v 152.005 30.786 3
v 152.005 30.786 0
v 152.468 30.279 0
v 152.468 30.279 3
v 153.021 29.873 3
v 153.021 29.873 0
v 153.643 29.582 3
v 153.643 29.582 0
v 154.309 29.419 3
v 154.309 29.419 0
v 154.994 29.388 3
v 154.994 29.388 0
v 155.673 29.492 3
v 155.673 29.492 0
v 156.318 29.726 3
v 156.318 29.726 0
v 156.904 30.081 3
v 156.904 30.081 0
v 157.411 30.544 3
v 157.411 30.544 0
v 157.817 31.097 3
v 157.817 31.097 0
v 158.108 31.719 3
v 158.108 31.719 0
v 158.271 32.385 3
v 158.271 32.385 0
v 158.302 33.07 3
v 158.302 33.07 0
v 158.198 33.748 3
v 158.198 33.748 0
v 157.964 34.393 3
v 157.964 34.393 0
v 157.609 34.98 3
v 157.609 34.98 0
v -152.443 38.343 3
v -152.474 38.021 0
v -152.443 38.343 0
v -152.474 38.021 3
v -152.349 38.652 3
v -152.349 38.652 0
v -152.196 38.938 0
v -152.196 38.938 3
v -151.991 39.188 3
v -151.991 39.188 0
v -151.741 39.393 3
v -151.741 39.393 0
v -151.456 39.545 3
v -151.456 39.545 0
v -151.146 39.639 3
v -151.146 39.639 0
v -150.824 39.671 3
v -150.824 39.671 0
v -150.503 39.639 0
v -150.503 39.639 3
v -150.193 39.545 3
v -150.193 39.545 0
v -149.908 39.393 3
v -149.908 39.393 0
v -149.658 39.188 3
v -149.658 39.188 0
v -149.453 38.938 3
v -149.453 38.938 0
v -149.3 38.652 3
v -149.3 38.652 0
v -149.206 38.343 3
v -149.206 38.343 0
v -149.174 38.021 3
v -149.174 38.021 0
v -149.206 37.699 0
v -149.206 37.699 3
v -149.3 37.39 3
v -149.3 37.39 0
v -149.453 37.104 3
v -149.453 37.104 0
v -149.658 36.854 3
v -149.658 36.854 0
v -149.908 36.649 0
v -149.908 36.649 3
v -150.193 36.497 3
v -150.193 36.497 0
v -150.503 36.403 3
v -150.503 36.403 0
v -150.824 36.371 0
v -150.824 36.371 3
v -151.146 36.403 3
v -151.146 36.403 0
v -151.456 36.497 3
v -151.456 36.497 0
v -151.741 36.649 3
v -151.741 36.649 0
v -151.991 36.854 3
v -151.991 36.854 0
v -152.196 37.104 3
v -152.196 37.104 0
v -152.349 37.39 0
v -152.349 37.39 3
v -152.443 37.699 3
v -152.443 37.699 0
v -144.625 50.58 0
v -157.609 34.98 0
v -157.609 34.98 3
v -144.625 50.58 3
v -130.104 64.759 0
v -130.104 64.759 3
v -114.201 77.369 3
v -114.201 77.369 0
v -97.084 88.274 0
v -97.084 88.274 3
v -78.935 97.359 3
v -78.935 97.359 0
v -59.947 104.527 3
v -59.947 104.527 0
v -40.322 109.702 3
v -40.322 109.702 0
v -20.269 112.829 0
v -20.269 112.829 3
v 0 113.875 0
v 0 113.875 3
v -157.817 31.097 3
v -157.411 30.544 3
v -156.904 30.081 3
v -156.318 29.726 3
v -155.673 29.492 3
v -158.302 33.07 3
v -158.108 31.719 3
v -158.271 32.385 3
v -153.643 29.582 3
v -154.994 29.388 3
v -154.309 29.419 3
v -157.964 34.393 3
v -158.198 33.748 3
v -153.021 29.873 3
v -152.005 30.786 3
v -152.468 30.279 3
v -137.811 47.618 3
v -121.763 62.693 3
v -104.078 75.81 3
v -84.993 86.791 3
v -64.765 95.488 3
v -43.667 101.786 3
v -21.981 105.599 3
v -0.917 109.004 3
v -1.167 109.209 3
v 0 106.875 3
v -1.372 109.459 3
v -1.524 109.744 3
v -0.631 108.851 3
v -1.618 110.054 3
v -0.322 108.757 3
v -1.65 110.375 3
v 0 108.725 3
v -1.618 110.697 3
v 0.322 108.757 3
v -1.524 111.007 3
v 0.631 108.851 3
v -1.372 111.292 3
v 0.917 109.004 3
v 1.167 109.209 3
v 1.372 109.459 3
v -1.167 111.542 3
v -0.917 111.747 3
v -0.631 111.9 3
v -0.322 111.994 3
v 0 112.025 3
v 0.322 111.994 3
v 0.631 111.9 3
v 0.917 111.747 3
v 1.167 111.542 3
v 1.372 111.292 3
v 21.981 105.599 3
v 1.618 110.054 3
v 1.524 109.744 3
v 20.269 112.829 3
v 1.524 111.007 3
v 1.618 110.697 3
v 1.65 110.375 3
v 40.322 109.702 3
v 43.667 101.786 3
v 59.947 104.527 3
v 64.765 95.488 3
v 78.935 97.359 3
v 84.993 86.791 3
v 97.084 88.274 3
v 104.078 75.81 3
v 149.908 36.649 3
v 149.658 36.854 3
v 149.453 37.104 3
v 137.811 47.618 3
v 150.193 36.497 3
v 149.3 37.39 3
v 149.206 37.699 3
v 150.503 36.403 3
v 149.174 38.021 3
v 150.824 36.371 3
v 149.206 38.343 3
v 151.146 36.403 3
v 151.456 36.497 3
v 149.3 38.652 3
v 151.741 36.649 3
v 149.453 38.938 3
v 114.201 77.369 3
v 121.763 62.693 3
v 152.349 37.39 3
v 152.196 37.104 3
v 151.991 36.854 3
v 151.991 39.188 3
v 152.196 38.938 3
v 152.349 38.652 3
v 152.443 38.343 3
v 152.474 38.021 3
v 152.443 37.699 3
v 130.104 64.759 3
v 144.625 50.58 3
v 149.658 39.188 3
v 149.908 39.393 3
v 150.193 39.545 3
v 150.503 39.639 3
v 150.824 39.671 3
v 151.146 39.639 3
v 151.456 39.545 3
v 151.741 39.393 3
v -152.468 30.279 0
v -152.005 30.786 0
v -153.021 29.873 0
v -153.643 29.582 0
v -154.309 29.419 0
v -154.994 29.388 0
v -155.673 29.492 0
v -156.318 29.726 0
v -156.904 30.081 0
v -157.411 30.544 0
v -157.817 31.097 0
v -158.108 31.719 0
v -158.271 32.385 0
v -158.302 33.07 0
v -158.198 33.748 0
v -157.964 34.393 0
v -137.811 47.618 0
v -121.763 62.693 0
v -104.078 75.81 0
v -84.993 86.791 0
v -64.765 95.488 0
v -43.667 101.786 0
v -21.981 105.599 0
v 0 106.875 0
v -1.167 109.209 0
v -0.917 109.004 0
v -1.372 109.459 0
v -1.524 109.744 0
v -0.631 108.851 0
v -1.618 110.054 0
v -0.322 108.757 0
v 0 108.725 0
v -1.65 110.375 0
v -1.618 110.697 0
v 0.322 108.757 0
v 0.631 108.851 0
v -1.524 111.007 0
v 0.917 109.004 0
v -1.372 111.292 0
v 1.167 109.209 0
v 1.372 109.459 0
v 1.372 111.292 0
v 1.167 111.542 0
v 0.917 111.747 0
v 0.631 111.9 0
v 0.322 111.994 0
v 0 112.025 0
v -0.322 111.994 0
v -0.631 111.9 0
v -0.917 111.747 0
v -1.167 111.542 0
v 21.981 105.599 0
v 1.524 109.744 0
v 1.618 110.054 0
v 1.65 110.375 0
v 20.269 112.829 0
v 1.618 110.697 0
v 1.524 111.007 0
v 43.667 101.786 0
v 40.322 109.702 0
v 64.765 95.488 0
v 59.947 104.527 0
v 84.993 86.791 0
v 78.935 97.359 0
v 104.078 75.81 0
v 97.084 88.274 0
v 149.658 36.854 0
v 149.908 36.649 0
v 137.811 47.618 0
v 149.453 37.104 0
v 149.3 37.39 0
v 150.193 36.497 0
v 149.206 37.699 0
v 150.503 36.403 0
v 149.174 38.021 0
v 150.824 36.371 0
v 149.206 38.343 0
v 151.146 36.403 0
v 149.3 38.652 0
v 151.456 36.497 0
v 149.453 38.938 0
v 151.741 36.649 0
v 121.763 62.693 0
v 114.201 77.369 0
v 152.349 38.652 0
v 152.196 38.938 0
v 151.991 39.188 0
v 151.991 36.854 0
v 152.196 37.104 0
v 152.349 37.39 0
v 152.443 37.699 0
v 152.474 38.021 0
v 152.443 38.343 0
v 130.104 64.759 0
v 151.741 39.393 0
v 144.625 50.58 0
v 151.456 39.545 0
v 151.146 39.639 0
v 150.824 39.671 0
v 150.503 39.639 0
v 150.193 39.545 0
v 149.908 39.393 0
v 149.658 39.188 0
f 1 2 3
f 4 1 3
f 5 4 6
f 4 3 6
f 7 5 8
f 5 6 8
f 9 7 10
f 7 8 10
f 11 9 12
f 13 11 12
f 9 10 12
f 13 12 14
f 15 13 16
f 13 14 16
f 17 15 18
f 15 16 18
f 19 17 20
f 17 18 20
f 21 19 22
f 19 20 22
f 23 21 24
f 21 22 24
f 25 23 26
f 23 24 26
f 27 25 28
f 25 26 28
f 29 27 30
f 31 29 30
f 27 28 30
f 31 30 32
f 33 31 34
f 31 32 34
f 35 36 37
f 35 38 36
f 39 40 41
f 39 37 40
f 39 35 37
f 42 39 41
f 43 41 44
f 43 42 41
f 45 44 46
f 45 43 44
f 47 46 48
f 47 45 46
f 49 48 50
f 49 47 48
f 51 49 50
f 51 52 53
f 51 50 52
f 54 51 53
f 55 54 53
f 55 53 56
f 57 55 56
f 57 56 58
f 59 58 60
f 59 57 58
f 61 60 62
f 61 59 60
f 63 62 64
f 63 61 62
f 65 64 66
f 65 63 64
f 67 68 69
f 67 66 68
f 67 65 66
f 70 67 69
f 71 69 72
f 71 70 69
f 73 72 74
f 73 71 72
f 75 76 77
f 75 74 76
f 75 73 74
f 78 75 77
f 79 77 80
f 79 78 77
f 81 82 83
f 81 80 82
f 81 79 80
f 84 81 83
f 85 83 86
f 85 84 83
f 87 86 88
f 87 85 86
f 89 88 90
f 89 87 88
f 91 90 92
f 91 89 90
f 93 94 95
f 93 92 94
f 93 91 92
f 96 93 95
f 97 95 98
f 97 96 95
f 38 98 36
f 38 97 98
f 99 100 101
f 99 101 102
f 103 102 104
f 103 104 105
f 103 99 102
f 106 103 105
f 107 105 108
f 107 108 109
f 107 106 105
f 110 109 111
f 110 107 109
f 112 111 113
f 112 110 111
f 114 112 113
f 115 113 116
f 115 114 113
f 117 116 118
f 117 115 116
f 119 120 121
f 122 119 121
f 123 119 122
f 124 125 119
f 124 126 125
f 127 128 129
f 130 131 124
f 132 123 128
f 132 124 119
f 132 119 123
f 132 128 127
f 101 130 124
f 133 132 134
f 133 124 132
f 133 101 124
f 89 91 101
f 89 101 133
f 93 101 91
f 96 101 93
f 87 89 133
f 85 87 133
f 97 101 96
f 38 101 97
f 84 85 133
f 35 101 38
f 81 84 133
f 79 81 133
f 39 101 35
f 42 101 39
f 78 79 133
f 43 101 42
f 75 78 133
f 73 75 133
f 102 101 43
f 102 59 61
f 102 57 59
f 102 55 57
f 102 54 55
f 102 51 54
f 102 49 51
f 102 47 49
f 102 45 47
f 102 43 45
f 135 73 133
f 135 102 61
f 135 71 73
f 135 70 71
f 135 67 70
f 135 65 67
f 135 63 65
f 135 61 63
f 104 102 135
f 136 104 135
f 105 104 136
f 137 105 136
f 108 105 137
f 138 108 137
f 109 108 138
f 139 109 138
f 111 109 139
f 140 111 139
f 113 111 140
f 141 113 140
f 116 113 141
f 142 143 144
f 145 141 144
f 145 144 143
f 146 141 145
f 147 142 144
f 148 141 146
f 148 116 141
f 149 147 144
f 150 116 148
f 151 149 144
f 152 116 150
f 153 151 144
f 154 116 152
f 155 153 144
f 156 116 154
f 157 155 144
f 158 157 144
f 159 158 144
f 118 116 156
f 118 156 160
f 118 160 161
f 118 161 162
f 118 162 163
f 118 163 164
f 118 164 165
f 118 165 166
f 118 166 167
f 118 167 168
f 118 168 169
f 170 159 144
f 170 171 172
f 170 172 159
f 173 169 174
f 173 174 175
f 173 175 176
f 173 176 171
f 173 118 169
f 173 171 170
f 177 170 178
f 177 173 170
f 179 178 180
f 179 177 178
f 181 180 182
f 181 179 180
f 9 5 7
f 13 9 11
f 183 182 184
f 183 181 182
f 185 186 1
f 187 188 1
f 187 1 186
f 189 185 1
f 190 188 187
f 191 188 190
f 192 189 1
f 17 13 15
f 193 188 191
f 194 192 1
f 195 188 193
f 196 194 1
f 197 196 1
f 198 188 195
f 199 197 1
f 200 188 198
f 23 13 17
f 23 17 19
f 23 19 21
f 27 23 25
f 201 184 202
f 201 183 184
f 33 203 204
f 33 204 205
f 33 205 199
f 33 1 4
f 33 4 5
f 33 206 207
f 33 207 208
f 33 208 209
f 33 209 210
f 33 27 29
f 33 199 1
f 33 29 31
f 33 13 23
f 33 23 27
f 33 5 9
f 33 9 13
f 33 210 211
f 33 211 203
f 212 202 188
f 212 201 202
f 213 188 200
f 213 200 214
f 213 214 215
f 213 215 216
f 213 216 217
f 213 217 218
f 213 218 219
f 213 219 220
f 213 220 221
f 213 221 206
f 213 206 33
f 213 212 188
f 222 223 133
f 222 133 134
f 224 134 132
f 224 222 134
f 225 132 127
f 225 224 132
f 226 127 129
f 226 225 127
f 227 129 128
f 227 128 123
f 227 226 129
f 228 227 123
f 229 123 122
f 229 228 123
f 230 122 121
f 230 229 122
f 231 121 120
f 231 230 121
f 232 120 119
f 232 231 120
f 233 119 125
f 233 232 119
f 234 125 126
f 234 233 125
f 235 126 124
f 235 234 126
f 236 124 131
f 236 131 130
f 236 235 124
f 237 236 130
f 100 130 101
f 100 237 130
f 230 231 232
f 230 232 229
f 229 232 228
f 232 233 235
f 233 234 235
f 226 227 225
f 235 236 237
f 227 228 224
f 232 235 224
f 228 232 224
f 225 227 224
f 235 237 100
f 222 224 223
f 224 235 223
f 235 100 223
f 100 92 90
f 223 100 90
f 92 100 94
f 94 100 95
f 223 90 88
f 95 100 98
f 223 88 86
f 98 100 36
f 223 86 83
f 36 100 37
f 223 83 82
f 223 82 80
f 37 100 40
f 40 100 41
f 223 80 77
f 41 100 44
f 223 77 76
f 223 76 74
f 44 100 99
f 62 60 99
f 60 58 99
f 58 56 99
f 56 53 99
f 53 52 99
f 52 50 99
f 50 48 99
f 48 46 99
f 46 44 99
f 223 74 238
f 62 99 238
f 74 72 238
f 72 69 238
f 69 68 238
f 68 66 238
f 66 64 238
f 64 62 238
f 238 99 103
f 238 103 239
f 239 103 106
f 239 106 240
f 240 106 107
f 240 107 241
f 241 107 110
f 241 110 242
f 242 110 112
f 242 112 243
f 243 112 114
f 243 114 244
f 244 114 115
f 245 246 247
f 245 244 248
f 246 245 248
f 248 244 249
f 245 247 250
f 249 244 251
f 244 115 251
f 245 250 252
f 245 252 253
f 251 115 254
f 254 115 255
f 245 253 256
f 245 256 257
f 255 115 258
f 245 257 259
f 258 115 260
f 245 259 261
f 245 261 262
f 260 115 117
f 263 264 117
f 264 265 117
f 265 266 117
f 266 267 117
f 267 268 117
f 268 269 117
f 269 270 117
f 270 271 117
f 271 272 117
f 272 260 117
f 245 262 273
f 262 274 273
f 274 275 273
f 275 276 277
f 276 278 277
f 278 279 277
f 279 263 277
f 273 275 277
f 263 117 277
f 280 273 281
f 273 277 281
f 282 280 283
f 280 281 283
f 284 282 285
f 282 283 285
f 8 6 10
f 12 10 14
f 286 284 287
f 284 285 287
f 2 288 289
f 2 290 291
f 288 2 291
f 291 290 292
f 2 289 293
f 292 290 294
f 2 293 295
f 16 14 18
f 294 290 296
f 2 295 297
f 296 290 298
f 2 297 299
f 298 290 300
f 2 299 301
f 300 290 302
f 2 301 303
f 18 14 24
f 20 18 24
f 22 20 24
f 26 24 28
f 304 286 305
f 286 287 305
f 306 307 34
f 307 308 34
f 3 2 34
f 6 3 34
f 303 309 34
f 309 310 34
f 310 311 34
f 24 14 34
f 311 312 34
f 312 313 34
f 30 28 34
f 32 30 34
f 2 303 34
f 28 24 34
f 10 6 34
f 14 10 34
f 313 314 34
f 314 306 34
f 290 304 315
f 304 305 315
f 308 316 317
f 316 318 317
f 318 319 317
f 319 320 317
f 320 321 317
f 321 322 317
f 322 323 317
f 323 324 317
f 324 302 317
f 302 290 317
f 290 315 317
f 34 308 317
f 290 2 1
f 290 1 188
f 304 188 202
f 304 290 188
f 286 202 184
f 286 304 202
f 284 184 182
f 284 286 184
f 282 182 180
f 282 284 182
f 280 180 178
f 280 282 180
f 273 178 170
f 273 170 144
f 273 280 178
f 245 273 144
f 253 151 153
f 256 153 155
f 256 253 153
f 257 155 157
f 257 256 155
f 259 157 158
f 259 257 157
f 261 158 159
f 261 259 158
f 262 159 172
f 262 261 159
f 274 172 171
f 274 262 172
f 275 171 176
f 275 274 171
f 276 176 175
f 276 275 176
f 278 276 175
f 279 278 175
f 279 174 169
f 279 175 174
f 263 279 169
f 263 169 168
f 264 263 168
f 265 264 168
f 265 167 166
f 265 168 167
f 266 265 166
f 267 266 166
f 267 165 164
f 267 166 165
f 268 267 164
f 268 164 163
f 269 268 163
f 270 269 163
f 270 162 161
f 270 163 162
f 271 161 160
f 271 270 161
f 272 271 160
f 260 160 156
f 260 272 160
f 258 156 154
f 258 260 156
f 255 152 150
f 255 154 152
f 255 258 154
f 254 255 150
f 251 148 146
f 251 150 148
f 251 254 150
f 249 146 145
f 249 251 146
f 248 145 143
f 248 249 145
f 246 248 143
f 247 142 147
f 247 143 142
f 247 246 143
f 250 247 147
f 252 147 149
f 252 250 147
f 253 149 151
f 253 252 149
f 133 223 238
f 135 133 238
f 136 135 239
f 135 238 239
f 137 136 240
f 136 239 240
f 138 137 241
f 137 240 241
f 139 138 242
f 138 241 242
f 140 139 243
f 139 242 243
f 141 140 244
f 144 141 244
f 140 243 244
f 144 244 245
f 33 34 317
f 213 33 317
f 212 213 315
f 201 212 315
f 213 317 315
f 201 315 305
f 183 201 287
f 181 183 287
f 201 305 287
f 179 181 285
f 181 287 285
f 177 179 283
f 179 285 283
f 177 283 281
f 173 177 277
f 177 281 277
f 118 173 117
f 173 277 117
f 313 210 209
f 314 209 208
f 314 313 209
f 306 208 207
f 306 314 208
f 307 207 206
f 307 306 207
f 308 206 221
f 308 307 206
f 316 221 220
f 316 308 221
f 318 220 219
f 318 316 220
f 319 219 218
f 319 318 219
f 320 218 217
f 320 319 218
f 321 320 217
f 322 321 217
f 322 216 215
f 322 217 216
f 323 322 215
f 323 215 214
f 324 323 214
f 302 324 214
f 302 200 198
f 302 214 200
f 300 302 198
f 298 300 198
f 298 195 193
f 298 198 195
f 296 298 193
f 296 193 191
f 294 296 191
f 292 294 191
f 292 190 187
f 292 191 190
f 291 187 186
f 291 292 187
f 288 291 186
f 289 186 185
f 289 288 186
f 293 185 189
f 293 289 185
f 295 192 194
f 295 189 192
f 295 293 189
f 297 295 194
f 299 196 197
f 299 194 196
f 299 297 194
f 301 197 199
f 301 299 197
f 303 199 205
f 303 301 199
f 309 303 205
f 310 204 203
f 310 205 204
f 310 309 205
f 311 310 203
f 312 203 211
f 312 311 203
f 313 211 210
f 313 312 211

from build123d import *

# Parameters (mm, degrees)
PAD015_DEPTH                        = 3
SKETCH054_R                         = 1.65
POCKET018_DEPTH                     = 358.938883
POCKET018_DEPTH_BACK                = 361.938883
BODY001003005003004_PLACEMENT_ANGLE = 60
CLONE027_PLACEMENT_ANGLE            = 60


with BuildPart() as part:
    # Sketch053 → Pad015 (new body)
    with BuildSketch(Plane.XY):
        with BuildLine():
            ThreePointArc((152.005097, 113.785532), (84.992984, 169.790723), (0, 189.875477))
            Line((0, 189.875477), (0, 196.875477))
            ThreePointArc((157.608957, 117.98038), (88.126358, 176.050273), (0, 196.875477))
            ThreePointArc((152.005097, 113.785532), (156.904451, 113.081026), (157.608957, 117.98038))
        make_face()
    pad015 = extrude(amount=PAD015_DEPTH)

    # Sketch054 → Pocket018 (cut, two sides)
    with BuildSketch(Plane.XY) as pocket018_sk:
        with Locations((150.82443, 121.020933)):
            Circle(SKETCH054_R)
        with BuildLine():
            ThreePointArc((0, 191.725477), (1.65, 193.375477), (0, 195.025477))
            Line((0, 191.725477), (0, 195.025477))
        make_face()
    pocket018 = extrude(amount=-POCKET018_DEPTH, mode=Mode.SUBTRACT) + extrude(pocket018_sk.sketch, amount=POCKET018_DEPTH_BACK, mode=Mode.SUBTRACT)

    # Mirrored020: Pad015, Pocket018 across Sketch053 V_Axis
    add(pad015.mirror(Plane(origin=(0, 0, 0), x_dir=(0, 0, 1), z_dir=(1, 0, 0))))
    add(pocket018.mirror(Plane(origin=(0, 0, 0), x_dir=(0, 0, 1), z_dir=(1, 0, 0))), mode=Mode.SUBTRACT)


with BuildPart() as part_1:
    # Body001003005003004 placement: moved
    add(part.part.rotate(Axis((0, 0, 0), (0, 0, 1)), BODY001003005003004_PLACEMENT_ANGLE))


with BuildPart() as part_2:
    # Clone027 placement: moved
    add(part_1.part.moved(Location((0, -83, 0))).rotate(Axis((0, -83, 0), (0, 0, -1)), CLONE027_PLACEMENT_ANGLE))


solid = part_2.part
